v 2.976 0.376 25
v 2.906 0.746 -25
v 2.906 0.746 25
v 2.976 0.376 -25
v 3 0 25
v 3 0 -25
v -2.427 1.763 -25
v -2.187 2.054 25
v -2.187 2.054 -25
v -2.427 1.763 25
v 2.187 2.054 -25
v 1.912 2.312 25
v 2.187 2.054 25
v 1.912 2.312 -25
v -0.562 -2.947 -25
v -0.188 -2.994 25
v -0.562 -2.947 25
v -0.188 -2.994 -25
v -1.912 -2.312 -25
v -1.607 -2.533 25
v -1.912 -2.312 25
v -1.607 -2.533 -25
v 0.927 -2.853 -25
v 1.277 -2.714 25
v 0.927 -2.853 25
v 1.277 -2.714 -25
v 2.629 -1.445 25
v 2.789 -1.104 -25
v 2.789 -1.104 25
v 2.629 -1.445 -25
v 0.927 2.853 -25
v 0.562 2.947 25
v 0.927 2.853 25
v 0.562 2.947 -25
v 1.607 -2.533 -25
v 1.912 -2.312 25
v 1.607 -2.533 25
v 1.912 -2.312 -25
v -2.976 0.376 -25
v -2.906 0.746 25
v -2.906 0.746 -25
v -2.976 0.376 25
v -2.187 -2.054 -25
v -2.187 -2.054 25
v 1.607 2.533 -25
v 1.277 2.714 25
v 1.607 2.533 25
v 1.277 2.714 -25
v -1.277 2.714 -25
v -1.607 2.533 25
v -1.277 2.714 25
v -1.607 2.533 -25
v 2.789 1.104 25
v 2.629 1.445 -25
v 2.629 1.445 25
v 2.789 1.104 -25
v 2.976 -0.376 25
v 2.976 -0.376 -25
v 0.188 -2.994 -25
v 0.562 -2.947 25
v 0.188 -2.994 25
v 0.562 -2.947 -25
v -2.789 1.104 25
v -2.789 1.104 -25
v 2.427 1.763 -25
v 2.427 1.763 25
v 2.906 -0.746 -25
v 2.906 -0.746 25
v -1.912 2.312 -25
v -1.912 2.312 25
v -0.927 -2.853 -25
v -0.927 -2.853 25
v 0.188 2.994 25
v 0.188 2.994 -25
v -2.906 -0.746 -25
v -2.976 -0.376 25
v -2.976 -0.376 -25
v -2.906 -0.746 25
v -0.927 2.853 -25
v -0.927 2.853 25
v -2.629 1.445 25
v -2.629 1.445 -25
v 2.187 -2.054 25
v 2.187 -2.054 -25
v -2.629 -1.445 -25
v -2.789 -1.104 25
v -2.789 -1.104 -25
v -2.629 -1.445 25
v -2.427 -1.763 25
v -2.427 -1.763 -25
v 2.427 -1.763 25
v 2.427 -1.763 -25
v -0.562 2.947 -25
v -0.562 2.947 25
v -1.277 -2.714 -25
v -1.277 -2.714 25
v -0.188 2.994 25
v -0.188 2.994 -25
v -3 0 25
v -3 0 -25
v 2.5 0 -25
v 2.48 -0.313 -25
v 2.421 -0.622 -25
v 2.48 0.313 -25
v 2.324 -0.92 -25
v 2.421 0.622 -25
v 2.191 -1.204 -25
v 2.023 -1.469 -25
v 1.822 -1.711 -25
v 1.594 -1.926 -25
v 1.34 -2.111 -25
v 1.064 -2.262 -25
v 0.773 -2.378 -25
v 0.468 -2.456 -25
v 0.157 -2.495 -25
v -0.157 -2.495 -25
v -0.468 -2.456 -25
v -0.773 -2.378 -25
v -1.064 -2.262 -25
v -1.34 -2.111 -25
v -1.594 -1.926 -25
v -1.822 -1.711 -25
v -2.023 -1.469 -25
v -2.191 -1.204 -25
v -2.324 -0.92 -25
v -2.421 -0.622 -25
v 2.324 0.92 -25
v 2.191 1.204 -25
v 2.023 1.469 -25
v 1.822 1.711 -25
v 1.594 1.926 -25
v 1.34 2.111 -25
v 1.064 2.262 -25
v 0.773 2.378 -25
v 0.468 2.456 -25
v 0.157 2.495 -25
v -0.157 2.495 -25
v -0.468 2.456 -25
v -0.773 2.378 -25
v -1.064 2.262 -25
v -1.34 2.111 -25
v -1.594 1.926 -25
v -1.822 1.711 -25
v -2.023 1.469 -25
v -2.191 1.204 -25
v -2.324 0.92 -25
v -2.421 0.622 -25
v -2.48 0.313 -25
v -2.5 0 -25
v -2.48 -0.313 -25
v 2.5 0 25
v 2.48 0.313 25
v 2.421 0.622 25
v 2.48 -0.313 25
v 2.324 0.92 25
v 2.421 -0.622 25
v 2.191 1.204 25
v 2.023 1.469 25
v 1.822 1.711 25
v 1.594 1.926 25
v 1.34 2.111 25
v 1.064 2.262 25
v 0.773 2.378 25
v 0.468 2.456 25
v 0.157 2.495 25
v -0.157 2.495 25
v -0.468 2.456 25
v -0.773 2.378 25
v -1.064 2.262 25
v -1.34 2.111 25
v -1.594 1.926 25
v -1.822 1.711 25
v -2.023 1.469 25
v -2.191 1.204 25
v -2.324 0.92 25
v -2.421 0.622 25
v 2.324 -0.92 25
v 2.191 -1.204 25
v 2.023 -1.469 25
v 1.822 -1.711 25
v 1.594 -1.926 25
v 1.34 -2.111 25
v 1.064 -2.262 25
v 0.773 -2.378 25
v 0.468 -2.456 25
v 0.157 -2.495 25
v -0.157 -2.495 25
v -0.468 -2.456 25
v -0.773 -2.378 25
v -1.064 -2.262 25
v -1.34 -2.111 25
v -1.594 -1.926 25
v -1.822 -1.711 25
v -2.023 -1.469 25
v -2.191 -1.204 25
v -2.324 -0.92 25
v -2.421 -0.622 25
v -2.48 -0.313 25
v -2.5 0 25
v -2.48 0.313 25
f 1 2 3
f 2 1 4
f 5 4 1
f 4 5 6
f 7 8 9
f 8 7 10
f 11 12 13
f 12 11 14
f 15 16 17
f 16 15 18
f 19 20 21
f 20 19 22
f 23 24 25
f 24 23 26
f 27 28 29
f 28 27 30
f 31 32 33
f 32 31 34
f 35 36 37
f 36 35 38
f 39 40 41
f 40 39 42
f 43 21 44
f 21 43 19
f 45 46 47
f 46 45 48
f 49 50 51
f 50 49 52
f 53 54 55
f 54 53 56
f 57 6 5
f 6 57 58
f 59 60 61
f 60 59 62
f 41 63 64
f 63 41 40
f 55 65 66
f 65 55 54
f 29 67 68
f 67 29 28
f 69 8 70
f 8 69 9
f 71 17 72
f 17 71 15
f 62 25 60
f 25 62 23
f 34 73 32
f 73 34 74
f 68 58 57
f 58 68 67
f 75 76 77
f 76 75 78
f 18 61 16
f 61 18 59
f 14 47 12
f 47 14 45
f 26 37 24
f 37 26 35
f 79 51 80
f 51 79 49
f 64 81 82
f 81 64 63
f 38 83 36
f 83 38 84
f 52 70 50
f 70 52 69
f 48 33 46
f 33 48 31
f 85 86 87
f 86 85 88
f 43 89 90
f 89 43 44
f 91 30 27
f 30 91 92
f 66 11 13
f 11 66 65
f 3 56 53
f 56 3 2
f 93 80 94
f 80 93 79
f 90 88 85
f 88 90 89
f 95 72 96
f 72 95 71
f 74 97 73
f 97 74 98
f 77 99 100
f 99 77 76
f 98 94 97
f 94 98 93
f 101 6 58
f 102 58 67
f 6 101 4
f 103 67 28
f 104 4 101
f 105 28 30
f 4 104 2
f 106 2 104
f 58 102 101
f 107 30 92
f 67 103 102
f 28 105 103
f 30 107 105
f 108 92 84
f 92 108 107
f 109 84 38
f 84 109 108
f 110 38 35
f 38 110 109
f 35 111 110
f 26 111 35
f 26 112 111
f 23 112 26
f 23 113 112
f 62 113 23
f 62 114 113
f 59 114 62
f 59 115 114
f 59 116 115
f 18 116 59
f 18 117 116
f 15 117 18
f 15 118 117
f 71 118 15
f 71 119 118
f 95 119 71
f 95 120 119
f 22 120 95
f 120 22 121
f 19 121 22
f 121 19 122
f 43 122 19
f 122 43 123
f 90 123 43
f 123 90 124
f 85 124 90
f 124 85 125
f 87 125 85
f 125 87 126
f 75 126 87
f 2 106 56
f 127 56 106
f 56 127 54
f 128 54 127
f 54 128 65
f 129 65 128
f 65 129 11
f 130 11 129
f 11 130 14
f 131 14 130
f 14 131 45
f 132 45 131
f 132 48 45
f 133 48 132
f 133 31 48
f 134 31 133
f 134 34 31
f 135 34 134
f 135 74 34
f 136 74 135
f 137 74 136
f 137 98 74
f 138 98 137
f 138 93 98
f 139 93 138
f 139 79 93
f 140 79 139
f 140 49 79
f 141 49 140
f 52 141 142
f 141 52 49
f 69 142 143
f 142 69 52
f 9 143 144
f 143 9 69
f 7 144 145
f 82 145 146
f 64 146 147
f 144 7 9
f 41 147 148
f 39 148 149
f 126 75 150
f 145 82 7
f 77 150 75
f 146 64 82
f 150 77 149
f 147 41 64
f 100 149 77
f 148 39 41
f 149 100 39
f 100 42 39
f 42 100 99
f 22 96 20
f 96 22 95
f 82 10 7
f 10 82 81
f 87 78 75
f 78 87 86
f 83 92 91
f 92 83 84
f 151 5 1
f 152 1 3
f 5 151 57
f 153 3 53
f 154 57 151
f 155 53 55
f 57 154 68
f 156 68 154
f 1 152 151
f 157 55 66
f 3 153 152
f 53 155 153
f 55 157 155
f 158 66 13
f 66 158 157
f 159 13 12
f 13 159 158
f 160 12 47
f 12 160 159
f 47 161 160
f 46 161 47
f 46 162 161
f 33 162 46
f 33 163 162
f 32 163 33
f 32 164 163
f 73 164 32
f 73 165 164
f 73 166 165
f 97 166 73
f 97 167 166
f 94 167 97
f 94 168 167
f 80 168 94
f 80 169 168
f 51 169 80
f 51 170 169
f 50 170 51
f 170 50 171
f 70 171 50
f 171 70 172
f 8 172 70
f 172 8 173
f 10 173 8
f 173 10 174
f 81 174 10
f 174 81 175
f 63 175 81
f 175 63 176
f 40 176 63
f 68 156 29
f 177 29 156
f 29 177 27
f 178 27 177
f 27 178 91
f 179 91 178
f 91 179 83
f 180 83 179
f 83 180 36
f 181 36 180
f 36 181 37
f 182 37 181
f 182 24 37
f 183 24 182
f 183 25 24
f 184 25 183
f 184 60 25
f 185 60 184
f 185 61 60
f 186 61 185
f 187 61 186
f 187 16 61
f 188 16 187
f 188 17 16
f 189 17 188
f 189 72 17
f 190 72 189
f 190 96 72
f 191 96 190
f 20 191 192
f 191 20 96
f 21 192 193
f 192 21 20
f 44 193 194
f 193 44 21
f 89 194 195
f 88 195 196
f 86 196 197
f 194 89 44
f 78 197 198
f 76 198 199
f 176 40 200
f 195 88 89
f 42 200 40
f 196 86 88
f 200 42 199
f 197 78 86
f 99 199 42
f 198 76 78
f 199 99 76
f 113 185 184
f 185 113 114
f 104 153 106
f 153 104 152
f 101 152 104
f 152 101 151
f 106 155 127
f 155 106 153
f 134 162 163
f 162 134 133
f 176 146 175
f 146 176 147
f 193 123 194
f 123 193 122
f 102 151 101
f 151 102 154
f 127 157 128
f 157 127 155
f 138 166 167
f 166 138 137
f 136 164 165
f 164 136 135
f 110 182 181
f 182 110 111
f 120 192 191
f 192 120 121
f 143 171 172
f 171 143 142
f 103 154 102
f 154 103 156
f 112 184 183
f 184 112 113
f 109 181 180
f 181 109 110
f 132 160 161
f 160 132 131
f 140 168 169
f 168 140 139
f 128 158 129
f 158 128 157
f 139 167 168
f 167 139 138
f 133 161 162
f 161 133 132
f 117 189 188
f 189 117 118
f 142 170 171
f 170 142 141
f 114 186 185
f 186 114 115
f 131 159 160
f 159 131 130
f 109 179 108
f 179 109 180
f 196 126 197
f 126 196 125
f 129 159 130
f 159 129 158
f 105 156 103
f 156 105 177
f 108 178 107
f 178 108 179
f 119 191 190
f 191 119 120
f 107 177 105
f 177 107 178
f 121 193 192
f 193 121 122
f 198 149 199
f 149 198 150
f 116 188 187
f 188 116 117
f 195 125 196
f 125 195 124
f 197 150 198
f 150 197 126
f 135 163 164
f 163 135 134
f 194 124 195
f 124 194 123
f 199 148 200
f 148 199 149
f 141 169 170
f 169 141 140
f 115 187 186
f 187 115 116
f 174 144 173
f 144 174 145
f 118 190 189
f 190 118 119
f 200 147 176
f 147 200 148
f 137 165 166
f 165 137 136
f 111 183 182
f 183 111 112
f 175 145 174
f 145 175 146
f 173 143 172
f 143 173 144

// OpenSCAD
$fn = 50;


difference() {
	union() {
		translate(v = [0, 0, -25.0000000000]) {
			cylinder(h = 50, r = 3.0000000000);
		}
	}
	union() {
		translate(v = [0, 0, -100.0000000000]) {
			cylinder(h = 200, r = 2.5000000000);
		}
	}
}
